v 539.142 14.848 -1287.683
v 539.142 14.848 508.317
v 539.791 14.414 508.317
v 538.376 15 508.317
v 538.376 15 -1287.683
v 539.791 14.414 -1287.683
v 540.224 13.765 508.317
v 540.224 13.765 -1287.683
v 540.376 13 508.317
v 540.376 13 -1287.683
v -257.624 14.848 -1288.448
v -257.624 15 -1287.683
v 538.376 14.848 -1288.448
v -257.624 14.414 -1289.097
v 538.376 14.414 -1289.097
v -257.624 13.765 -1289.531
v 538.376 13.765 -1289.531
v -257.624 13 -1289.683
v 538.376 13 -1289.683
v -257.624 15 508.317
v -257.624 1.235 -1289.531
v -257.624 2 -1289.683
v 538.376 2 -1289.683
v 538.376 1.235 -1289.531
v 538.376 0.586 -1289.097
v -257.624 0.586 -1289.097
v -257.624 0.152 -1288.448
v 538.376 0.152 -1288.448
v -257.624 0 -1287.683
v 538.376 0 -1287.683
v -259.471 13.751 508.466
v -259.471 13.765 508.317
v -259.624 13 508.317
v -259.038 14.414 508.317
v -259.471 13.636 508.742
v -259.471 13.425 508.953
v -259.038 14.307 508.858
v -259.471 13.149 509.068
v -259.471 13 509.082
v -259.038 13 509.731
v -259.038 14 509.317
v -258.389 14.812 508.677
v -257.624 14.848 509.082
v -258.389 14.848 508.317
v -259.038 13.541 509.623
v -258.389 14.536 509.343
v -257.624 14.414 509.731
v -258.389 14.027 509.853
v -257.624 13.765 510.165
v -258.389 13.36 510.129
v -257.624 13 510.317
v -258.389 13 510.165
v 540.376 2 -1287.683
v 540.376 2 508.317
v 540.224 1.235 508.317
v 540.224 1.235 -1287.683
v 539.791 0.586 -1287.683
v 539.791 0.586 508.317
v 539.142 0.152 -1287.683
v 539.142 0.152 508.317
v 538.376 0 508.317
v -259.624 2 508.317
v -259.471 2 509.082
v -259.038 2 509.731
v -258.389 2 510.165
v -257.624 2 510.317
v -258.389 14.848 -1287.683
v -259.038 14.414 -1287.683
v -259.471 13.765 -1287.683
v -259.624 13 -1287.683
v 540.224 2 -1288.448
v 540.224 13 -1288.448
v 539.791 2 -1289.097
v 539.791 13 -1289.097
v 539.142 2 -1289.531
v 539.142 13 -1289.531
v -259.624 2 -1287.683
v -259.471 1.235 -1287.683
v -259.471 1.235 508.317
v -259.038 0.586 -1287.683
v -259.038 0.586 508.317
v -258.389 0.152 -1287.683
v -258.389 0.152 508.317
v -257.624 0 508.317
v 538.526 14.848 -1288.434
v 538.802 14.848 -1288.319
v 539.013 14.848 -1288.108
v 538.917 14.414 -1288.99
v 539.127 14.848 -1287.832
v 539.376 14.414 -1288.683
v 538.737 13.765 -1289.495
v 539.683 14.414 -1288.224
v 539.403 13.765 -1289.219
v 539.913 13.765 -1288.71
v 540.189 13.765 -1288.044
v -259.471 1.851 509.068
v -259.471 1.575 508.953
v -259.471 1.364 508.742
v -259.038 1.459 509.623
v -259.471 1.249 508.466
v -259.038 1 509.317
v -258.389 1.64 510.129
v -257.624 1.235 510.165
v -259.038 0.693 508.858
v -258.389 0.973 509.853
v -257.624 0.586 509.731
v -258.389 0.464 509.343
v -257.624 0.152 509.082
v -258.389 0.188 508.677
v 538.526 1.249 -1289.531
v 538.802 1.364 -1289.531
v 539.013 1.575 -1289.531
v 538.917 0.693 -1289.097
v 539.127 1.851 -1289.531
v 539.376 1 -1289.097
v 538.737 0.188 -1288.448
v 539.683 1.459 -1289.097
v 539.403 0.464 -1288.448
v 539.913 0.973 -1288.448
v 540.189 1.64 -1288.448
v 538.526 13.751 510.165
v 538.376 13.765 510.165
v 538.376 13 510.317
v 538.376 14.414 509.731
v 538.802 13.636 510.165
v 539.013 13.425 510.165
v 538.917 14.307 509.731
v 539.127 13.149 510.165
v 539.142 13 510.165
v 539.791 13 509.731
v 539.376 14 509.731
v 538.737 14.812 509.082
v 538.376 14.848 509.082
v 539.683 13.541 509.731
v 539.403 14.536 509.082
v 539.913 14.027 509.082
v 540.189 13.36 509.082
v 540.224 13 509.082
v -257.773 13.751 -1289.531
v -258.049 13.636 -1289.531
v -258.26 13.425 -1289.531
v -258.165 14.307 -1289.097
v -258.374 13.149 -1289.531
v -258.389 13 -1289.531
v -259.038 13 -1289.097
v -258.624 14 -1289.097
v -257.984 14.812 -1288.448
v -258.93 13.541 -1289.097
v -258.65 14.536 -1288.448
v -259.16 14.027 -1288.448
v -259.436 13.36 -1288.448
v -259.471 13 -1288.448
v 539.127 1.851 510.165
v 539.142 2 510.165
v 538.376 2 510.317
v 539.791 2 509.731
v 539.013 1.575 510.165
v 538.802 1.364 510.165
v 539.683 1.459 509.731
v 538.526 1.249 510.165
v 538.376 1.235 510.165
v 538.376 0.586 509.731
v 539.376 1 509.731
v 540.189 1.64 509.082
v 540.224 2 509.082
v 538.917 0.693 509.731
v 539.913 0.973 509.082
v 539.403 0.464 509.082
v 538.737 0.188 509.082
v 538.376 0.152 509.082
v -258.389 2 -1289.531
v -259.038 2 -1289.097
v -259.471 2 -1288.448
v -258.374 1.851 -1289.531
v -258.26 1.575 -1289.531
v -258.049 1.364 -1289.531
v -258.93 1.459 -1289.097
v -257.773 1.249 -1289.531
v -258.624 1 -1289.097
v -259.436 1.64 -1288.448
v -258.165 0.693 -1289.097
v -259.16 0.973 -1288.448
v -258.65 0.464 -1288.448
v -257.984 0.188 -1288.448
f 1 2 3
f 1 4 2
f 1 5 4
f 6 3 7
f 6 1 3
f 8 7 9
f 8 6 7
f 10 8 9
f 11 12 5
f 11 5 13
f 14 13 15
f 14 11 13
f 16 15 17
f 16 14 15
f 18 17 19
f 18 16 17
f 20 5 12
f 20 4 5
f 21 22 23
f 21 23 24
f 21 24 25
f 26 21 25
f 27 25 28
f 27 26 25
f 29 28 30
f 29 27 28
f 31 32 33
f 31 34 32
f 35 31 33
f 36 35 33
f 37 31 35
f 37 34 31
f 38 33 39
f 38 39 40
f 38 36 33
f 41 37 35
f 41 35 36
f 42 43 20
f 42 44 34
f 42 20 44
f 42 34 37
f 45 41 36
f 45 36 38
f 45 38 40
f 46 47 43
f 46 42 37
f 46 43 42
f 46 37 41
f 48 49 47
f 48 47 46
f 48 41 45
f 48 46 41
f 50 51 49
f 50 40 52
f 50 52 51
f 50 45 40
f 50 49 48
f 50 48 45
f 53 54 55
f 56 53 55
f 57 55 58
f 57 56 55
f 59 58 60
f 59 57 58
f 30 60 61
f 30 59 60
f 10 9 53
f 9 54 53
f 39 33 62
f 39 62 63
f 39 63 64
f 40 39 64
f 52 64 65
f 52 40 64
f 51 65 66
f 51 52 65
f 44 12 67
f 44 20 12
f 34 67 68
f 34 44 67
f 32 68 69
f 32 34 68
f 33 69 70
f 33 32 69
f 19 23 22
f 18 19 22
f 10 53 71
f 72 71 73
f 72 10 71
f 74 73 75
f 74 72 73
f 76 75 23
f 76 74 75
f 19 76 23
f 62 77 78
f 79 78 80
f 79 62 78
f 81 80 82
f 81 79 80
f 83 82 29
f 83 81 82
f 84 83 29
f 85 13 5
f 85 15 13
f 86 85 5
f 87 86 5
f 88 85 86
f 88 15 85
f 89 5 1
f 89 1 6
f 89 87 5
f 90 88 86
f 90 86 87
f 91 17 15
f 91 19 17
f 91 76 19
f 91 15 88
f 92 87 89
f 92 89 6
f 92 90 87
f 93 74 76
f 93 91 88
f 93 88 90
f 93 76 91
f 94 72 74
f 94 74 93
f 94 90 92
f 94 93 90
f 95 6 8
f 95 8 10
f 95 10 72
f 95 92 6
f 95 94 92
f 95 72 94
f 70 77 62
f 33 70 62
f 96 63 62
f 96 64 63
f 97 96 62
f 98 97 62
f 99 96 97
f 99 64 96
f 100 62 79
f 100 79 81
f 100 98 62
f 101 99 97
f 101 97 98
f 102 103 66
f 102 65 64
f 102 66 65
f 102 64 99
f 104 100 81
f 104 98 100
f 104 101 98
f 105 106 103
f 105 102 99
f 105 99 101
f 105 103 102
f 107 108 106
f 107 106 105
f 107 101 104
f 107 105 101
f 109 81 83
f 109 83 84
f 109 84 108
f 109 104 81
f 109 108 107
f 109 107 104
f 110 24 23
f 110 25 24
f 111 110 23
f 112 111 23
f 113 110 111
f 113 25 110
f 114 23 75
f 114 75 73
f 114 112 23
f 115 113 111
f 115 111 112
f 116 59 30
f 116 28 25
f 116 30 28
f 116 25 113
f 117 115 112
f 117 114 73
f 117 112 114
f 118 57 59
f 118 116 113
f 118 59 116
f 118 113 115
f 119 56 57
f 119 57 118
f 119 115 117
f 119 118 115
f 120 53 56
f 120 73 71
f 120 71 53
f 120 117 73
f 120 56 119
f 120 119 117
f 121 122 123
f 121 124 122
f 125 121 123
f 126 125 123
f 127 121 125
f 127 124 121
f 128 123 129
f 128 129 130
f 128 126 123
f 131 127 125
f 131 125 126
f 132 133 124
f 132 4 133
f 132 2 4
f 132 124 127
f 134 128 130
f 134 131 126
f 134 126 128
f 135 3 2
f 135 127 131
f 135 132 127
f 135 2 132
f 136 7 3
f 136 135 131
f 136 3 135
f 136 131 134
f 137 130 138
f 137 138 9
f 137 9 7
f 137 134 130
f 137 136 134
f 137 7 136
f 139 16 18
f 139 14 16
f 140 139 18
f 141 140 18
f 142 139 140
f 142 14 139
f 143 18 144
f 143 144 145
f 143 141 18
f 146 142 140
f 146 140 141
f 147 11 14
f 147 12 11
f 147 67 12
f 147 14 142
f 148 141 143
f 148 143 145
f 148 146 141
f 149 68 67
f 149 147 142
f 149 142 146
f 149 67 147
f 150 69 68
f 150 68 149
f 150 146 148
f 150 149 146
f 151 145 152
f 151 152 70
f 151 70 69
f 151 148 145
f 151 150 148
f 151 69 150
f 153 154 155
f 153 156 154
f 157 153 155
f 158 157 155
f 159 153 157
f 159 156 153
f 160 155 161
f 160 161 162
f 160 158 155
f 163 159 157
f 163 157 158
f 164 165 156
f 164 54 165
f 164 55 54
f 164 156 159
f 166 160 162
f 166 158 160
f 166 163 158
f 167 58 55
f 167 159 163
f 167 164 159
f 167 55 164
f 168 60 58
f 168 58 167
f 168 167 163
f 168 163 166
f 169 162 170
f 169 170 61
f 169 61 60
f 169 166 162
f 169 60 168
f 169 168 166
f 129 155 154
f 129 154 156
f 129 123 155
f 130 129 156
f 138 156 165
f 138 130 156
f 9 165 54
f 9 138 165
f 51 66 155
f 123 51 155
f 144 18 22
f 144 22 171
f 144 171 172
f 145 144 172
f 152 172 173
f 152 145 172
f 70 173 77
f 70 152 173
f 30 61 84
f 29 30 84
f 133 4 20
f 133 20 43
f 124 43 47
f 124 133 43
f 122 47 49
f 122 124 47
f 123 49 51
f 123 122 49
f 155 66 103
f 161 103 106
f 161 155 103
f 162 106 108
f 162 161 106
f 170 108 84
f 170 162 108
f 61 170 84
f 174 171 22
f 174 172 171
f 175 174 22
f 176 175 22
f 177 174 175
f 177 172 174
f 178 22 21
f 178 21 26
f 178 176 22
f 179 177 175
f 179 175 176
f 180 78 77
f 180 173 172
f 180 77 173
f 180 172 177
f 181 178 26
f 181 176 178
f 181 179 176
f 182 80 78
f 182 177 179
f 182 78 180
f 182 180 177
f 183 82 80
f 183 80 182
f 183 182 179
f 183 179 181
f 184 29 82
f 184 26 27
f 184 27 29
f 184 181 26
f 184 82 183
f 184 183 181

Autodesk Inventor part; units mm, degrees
ref_plane "YZ Plane" through (0, 0, 0) normal (1, 0, 0) x (0, 1, 0)
ref_plane "XZ Plane" through (0, 0, 0) normal (0, 1, 0) x (-1, 0, 0)
ref_plane "XY Plane" through (0, 0, 0) normal (0, 0, 1) x (1, 0, 0)
sketch "Sketch1" plane through (0, 0, 0) normal (0, 1, 0) x (-1, 0, 0)
  line L0 (259.6237, 510.3169) -> (-540.3763, 510.3169)
  line L1 (-540.3763, 510.3169) -> (-540.3763, -1289.6831)
  line L2 (-540.3763, -1289.6831) -> (259.6237, -1289.6831)
  line L3 (259.6237, -1289.6831) -> (259.6237, 510.3169)
  point P0 (0, 0)
  dimension "d0" = 1800
  dimension "d1" = 800
extrude "Extrusion1" add sketch "Sketch1" along normal blind 15
fillet "Fillet1" radius 2 12 edges at (540.3763, 0, -389.6831) (540.3763, 7.5, -1289.6831) (540.3763, 15, -389.6831) (540.3763, 7.5, 510.3169) (140.3763, 0, 510.3169) (140.3763, 15, 510.3169) (-259.6237, 7.5, 510.3169) (-259.6237, 0, -389.6831) (-259.6237, 15, -389.6831) (-259.6237, 7.5, -1289.6831) (140.3763, 0, -1289.6831) (140.3763, 15, -1289.6831)
properties part number "tavolo" material "Wood (Birch)"
